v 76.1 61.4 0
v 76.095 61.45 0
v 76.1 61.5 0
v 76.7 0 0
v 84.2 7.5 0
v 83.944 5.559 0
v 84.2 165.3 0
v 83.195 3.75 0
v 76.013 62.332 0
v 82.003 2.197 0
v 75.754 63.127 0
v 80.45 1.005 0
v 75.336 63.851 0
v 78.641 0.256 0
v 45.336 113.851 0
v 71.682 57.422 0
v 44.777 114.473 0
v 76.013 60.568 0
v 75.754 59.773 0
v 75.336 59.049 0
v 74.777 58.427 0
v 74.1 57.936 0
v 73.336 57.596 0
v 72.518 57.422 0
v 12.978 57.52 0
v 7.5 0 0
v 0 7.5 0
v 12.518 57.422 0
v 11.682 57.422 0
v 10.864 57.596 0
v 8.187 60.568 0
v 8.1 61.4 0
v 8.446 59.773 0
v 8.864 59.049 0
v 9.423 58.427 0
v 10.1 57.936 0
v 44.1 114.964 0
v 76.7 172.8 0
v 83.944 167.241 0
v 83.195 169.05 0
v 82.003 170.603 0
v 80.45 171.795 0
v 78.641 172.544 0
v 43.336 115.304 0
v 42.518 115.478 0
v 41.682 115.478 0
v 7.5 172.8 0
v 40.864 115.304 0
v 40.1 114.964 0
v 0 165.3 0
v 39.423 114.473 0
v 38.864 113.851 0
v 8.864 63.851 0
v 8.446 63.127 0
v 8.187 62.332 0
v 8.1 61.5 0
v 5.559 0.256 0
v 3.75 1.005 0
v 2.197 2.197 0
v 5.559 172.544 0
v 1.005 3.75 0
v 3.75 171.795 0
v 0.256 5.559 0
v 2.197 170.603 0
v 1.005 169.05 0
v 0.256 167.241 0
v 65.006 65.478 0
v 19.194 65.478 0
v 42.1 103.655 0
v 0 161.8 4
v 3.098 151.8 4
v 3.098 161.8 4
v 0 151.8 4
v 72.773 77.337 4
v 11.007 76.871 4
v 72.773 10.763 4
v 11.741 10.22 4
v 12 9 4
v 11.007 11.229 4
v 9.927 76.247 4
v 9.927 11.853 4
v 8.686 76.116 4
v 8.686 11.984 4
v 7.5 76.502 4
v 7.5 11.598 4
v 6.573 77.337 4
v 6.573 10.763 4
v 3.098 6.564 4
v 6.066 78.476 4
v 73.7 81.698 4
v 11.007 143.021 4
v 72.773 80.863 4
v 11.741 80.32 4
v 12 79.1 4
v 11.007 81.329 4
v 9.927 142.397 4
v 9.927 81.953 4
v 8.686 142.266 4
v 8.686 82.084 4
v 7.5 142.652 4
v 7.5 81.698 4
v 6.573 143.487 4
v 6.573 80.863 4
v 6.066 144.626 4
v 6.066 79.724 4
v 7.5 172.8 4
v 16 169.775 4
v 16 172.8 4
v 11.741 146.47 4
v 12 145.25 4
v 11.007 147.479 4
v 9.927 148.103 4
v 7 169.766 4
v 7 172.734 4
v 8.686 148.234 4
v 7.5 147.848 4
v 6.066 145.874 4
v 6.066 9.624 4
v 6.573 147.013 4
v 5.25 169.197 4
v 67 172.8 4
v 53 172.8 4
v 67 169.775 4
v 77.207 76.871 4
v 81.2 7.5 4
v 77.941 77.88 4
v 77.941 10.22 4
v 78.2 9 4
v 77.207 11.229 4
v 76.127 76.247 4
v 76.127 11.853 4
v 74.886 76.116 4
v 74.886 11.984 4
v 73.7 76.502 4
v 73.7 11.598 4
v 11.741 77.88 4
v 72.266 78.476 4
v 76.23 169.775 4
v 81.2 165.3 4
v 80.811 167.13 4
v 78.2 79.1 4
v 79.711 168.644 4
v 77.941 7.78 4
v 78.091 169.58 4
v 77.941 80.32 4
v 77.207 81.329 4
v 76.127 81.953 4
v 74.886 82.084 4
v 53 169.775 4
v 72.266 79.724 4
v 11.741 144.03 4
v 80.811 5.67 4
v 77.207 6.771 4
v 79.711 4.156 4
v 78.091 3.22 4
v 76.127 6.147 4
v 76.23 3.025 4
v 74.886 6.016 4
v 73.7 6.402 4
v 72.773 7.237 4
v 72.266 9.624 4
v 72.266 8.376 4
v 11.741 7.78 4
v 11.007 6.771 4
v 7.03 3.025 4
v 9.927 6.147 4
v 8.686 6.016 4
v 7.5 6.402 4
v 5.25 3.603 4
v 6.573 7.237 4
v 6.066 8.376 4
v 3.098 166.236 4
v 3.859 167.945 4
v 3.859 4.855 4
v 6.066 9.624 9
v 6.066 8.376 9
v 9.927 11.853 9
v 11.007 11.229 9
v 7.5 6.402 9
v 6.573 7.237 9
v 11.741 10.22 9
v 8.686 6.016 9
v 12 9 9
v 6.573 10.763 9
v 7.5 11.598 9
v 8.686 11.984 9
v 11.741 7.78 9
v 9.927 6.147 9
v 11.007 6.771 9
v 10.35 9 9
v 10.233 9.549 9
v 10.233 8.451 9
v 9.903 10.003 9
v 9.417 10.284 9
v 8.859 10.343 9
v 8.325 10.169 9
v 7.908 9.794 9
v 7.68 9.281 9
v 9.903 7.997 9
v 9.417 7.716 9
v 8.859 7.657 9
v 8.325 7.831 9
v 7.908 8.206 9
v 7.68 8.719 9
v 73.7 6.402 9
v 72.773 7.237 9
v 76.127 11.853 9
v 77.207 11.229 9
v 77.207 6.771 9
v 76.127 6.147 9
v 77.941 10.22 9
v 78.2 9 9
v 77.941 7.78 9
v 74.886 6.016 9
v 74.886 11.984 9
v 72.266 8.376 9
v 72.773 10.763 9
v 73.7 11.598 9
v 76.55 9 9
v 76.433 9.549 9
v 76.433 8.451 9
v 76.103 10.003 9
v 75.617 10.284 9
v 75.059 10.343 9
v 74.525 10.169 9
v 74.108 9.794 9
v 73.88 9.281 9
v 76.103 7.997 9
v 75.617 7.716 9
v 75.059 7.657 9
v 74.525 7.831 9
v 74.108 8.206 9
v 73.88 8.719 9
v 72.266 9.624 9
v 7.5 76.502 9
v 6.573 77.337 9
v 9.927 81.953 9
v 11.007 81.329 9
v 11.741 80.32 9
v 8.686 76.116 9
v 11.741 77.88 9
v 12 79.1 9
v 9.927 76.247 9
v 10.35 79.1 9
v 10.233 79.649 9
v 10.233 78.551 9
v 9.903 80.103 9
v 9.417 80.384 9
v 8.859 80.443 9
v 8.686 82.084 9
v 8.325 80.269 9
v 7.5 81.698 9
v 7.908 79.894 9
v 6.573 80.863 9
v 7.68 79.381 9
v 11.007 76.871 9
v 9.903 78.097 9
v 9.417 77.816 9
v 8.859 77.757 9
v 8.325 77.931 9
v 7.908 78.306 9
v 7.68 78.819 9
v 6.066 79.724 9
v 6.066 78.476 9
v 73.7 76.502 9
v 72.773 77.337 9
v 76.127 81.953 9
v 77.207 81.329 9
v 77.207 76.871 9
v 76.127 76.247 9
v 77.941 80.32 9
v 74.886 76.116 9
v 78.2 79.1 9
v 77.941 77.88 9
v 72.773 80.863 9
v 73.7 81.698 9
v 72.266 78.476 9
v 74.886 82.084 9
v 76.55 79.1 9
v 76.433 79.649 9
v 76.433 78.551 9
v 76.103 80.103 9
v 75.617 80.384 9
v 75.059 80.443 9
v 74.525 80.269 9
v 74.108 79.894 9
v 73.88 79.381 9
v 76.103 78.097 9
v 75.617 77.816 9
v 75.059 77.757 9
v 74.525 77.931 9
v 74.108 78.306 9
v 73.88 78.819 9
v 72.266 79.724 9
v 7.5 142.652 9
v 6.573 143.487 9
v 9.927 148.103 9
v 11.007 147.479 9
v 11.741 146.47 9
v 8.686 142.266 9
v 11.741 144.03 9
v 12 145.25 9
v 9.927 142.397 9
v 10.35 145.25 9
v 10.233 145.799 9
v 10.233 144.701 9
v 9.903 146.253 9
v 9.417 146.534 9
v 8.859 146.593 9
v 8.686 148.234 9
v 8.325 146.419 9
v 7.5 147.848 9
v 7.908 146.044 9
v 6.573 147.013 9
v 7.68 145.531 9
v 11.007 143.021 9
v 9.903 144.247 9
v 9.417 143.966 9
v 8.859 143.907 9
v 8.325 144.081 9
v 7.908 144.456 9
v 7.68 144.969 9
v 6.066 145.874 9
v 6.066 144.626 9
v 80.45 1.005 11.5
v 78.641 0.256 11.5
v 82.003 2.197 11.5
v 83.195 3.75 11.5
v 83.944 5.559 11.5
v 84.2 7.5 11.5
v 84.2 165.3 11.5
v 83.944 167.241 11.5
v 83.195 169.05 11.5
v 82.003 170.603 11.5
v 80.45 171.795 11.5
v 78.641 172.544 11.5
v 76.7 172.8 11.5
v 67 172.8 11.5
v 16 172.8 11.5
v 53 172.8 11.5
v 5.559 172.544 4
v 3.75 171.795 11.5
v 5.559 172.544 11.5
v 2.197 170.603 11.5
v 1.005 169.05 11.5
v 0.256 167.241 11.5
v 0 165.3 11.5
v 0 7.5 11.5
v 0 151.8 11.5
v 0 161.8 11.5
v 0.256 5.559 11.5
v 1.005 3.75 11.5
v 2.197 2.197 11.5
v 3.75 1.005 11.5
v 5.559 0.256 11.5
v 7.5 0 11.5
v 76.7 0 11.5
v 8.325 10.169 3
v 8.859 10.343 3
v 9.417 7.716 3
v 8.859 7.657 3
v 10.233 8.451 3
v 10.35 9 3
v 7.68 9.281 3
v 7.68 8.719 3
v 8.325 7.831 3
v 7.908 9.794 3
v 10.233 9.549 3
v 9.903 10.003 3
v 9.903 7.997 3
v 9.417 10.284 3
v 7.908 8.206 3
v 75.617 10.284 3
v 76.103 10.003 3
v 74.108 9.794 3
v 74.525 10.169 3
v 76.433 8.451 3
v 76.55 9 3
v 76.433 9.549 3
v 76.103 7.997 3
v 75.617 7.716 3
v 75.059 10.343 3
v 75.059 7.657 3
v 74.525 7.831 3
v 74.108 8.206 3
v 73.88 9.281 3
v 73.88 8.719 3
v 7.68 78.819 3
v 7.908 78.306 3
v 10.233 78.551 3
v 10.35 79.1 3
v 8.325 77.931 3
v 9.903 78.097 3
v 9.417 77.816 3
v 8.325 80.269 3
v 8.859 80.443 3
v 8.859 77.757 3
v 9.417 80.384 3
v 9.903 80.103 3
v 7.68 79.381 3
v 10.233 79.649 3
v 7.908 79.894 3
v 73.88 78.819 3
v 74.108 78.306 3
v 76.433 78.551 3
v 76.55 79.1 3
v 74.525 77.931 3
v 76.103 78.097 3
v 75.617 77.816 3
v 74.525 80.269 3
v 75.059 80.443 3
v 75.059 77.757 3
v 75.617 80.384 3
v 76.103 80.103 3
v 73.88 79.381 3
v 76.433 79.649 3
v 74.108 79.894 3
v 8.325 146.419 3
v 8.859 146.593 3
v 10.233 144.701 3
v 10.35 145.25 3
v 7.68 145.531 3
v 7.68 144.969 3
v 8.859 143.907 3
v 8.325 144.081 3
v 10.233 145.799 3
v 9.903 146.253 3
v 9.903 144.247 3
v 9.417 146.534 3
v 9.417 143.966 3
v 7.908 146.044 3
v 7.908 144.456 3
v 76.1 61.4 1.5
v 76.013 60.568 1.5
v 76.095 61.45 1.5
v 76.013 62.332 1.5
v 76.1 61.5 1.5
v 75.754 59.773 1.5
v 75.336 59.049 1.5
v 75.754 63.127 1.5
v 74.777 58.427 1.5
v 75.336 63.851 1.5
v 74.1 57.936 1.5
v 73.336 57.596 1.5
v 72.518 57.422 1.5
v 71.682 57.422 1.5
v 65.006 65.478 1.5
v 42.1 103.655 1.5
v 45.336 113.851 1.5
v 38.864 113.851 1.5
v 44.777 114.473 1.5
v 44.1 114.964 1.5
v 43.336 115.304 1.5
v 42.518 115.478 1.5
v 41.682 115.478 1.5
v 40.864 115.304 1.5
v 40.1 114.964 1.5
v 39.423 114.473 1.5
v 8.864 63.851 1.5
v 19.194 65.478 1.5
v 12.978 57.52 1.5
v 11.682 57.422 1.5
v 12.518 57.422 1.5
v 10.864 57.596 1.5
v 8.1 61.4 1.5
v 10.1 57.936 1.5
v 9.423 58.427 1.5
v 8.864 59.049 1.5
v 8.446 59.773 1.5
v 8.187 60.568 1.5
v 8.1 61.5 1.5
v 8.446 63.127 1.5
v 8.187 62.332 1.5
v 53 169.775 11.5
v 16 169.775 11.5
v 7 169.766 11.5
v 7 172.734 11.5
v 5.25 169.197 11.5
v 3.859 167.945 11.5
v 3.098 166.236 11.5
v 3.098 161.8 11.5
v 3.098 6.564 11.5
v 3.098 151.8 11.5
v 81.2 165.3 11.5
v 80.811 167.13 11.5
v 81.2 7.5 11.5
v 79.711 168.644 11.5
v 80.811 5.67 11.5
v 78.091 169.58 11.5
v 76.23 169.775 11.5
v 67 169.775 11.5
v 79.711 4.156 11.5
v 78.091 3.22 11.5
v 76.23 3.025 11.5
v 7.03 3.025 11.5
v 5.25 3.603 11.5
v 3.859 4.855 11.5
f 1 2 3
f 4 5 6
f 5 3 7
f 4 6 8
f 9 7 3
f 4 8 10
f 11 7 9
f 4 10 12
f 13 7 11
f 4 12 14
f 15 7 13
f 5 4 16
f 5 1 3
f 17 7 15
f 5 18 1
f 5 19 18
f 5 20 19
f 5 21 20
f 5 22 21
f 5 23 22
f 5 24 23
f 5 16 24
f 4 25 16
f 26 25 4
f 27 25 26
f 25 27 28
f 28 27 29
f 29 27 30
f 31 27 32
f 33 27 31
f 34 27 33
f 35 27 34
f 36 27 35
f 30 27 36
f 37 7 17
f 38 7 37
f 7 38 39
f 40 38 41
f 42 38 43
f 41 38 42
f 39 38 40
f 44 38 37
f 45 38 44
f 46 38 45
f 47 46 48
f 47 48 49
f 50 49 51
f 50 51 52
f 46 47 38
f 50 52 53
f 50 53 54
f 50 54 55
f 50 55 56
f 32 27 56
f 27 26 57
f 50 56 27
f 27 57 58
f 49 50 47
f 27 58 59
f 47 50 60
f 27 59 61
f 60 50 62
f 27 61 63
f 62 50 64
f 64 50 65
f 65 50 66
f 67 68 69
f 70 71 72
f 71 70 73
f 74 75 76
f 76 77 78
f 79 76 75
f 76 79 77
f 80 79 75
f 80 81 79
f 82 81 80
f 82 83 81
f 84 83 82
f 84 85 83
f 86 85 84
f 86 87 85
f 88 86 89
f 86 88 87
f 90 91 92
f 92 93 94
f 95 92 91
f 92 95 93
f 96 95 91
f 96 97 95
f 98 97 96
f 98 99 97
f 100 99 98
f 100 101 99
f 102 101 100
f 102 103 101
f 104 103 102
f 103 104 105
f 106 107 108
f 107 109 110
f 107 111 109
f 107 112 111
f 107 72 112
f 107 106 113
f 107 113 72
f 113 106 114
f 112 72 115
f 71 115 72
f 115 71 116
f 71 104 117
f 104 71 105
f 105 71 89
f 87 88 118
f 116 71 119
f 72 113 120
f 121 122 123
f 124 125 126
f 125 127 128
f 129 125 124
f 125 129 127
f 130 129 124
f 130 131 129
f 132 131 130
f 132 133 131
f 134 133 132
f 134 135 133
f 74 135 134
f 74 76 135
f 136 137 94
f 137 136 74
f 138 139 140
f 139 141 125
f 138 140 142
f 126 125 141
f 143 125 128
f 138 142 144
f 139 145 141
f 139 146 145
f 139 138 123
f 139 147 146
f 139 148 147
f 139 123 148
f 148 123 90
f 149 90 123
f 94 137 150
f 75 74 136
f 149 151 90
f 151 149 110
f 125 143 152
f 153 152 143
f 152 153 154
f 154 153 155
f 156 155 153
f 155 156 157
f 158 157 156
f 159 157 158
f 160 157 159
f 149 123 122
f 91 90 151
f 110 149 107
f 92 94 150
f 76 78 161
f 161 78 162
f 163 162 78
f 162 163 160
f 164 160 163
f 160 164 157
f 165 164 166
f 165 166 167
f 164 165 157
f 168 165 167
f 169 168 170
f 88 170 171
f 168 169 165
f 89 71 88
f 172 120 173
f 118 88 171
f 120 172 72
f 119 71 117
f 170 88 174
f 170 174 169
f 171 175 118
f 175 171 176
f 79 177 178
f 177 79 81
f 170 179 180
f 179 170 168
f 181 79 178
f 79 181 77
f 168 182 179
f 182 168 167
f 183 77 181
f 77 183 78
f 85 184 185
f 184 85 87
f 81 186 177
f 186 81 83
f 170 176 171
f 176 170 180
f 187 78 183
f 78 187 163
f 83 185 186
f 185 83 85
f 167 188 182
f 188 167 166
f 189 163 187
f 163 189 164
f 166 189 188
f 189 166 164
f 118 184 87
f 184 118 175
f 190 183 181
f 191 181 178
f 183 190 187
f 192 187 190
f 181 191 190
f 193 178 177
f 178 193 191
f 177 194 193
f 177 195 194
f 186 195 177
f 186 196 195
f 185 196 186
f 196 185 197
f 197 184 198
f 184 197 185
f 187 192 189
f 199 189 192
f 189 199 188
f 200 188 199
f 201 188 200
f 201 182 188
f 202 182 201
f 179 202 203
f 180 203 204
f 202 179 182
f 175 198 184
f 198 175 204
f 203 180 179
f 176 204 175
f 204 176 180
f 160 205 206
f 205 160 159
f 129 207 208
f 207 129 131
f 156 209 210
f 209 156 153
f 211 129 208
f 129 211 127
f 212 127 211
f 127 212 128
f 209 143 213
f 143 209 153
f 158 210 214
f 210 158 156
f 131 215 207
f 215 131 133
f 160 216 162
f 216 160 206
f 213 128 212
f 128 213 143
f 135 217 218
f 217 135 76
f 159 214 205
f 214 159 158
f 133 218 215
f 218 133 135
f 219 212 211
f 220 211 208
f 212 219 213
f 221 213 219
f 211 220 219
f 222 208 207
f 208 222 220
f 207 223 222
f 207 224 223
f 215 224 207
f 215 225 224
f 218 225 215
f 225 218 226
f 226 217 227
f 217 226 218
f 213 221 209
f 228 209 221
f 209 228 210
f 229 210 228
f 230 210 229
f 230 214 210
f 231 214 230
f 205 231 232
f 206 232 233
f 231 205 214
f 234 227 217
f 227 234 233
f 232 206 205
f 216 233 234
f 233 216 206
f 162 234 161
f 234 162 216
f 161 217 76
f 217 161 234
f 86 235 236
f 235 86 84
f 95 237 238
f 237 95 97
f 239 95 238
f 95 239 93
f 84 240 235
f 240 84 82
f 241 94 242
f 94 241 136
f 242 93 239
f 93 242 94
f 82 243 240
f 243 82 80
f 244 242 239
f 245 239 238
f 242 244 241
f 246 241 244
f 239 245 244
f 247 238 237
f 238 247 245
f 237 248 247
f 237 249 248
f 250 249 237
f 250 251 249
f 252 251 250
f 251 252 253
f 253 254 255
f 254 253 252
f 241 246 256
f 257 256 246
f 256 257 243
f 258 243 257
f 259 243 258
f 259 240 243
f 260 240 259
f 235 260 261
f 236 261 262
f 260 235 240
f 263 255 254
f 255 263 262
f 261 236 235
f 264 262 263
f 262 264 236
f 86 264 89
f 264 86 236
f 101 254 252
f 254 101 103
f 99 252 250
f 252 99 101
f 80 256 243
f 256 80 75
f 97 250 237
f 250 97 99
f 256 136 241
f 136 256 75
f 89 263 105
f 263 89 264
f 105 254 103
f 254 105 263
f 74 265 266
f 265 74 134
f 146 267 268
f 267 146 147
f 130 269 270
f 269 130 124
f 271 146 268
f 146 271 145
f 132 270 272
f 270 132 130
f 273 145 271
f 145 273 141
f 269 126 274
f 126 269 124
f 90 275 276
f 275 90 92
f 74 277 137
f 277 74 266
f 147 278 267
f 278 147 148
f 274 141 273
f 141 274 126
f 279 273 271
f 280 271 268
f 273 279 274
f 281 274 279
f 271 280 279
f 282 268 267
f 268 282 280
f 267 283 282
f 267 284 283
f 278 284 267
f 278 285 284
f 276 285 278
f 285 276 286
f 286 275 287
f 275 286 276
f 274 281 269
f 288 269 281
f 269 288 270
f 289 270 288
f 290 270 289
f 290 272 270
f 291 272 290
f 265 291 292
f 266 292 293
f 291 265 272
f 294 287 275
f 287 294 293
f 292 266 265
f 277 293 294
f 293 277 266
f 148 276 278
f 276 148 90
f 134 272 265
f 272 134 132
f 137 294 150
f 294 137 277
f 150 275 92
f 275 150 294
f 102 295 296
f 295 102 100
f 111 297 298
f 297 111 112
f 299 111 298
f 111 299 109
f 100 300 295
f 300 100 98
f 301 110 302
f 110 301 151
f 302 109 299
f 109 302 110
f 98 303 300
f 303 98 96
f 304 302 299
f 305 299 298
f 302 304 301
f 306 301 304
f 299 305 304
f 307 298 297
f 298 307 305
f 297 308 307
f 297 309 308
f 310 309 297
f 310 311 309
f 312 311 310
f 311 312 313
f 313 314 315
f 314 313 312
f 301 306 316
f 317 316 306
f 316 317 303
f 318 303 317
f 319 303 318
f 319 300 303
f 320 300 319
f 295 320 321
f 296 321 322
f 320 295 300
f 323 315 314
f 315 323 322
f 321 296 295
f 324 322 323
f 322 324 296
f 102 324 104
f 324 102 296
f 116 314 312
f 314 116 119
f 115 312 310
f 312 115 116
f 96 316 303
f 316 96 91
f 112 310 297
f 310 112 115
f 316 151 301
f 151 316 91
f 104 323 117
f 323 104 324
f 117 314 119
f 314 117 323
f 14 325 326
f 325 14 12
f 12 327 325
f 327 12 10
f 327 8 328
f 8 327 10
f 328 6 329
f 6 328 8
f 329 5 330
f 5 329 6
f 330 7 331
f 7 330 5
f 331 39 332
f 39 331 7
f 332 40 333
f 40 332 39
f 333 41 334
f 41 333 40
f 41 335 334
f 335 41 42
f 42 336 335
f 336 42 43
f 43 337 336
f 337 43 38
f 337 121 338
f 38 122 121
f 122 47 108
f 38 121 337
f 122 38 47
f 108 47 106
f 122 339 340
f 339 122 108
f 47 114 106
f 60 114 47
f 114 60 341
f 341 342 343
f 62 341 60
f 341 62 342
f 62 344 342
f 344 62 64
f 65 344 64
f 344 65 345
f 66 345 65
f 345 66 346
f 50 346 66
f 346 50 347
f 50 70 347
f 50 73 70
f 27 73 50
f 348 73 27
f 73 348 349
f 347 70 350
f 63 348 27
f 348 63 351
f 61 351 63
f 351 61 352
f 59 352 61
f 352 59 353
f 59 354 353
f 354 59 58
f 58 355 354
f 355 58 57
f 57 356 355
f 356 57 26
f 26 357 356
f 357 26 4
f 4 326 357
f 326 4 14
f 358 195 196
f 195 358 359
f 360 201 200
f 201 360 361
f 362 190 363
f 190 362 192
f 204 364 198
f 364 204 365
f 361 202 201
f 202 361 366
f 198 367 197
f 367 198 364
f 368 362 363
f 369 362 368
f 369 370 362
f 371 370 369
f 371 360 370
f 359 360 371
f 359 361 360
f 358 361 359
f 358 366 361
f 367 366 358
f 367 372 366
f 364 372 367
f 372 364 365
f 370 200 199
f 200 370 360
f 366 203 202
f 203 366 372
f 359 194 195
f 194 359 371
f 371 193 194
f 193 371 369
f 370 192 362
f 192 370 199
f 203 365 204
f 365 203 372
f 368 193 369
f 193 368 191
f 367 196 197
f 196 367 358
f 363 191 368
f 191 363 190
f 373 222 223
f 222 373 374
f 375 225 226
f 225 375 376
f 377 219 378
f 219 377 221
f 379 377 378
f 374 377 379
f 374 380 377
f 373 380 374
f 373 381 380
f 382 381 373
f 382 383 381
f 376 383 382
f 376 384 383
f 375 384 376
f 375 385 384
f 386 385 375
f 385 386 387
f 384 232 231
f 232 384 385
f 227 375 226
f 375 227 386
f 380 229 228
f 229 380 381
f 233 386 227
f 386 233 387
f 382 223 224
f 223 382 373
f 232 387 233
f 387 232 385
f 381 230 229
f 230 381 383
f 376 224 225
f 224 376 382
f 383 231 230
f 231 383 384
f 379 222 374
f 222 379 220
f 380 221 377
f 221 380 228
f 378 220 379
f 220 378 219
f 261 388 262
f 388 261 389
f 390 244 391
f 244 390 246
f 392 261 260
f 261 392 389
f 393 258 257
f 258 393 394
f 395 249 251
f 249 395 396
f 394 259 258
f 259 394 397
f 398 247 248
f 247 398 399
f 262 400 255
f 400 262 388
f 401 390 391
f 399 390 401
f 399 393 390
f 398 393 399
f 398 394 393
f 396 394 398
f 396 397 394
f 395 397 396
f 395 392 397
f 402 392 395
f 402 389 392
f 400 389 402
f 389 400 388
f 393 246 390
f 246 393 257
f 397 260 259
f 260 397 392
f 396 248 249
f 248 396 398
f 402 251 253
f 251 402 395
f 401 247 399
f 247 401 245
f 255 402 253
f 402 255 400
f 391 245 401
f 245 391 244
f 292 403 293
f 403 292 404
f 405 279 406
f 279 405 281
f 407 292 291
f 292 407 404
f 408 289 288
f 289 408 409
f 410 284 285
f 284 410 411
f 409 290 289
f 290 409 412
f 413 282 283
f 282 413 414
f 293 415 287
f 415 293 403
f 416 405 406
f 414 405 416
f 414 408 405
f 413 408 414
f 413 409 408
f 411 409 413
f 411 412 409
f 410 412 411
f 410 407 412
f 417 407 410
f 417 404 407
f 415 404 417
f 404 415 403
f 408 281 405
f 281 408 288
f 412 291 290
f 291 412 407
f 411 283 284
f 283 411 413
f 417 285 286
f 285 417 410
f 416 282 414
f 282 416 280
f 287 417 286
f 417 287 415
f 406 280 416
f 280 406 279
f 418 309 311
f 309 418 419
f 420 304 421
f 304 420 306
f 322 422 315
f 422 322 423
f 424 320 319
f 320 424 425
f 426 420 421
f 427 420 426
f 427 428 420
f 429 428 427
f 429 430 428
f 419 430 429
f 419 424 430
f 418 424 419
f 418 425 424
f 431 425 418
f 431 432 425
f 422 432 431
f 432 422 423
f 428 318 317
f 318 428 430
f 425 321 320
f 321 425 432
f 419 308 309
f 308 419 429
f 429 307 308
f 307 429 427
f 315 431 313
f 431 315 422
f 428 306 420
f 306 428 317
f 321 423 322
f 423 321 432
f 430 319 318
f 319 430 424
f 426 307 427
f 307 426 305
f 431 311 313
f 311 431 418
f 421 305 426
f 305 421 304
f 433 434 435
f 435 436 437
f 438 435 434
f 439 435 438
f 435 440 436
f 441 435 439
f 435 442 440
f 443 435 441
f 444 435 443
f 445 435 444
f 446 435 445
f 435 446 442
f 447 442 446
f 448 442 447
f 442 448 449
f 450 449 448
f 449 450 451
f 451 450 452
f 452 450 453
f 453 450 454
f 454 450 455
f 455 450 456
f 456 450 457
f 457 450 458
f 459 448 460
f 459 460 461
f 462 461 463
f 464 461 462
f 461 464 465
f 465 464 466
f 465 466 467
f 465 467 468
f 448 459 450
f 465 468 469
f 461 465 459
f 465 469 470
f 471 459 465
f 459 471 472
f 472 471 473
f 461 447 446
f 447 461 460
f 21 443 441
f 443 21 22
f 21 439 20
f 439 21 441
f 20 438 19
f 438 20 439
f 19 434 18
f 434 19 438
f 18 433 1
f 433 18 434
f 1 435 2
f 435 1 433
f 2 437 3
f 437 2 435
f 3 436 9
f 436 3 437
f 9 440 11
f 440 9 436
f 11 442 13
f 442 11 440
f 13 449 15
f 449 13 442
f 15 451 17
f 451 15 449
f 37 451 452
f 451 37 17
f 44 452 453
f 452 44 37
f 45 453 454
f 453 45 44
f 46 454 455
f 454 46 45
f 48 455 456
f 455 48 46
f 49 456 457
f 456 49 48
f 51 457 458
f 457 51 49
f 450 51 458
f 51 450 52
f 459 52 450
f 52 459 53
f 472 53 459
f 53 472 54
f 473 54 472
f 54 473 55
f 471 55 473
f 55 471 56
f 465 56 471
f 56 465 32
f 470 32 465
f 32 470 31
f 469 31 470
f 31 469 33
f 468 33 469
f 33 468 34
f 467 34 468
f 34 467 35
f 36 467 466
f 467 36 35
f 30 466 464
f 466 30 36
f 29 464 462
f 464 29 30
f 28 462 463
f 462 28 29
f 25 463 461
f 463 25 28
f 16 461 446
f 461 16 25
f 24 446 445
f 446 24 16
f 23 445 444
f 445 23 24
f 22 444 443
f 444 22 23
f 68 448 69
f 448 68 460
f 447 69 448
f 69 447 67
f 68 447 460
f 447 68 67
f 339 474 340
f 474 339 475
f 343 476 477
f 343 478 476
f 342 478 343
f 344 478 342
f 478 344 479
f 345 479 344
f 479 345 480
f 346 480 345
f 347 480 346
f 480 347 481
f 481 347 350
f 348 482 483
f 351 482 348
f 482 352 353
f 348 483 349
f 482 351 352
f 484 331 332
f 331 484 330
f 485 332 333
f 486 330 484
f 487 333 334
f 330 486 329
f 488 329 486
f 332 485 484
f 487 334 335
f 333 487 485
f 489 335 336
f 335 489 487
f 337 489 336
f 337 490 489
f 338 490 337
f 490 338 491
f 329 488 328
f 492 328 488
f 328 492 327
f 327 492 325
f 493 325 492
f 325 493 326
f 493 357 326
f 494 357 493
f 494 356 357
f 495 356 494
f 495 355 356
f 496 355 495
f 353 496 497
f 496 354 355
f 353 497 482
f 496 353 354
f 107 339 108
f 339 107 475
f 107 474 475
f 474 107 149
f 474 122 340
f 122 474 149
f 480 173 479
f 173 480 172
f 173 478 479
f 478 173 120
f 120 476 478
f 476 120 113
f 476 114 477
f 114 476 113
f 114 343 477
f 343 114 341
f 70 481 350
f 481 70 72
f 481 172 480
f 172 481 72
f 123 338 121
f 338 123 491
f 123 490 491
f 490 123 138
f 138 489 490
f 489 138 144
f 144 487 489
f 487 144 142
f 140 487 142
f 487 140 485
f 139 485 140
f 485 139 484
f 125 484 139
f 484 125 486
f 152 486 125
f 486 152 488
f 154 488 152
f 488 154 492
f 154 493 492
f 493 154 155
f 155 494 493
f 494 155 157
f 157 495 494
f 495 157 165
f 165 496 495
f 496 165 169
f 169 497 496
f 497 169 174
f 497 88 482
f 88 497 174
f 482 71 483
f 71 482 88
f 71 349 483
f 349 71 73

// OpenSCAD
delta_pico_width = 78.2;
delta_pico_height = 166.8;
delta_pico_corner_radius = 4.5;

border_size = 3;

power_switch_offset = 8;
power_switch_length = 10;
jst_offset = 4;
jst_length = 9;
usb_offset = 50;
usb_length = 14;

screws_edge_distance = 6;
bottom_screws_offset = 6;
middle_screws_offset = 76.1;
top_screw_offset = 142.25;

edge_cutout_size = border_size + 1;

base_height = 4;
screw_depth = 6;
peg_height = 5;

module delta_pico() {
    translate([delta_pico_corner_radius, delta_pico_corner_radius])
    minkowski() {
        circle(delta_pico_corner_radius);
        square([
            delta_pico_width - delta_pico_corner_radius * 2,
            delta_pico_height - delta_pico_corner_radius * 2
        ]);
    }
}

module delta_pico_outline() {
    difference() {
        translate([border_size + delta_pico_corner_radius, border_size + delta_pico_corner_radius])
        minkowski() {
            circle(border_size + delta_pico_corner_radius);
            square([
                delta_pico_width - delta_pico_corner_radius * 2,
                delta_pico_height - delta_pico_corner_radius * 2
            ]);
        }

        // Cut out the calculator itself
        translate([border_size, border_size])
        delta_pico();
    }
}

module delta_pico_outline_with_cutouts() {
    difference() {
        delta_pico_outline();
        
        // Cut out the power switch
        translate([0, border_size + delta_pico_height - power_switch_offset - power_switch_length])
        square([edge_cutout_size, power_switch_length]);
        
        // Cut out the JST connector
        translate([border_size + jst_offset, border_size + delta_pico_height - 1])
        square([jst_length, edge_cutout_size]);
        
        // Cut out the USB port
        translate([border_size + usb_offset, border_size + delta_pico_height - 1])
        square([usb_length, edge_cutout_size]);
    }
}

module screw_hole() {
    linear_extrude(screw_depth)
    circle(d=2.7, $fn=15);
}

module screw_peg() {
    linear_extrude(peg_height)
    circle(d=6, $fn=15);
}

module base() {
    difference() {
        union() {
            linear_extrude(base_height)
            delta_pico_outline();
            
            translate([border_size, border_size]) {
                linear_extrude(base_height)
                delta_pico();
                
                translate([6, 6, base_height])
                screw_peg();
                
                translate([delta_pico_width - 6, 6, base_height])
                screw_peg();
                
                translate([6, middle_screws_offset, base_height])
                screw_peg();
                
                translate([delta_pico_width - 6, middle_screws_offset, base_height])
                screw_peg();
                
                translate([6, top_screw_offset, base_height])
                screw_peg();
            }
        }
        
        translate([border_size, border_size]) {
            screw_offset = base_height - screw_depth + peg_height;
            
            translate([6, 6, screw_offset])
            screw_hole();
            
            translate([delta_pico_width - 6, 6, screw_offset])
            screw_hole();
            
            translate([6, middle_screws_offset, screw_offset])
            screw_hole();
                
            translate([delta_pico_width - 6, middle_screws_offset, screw_offset])
            screw_hole();
            
            translate([6, top_screw_offset, screw_offset])
            screw_hole();
        }
    }
}

module logo() {
    translate([3 - 60 / 2, 3 - 50 / 2])
    minkowski() {
        polygon([
            [0, 0],
            [30, 50],
            [60, 0],
            [0, 0.1],
            [60, 0.1],
            [30, 50.1],
            [0, 0.1]
        ]);
        circle(4, $fn=30);
    }
}

difference() {
    base();

    translate([delta_pico_width / 2, delta_pico_height / 2])
    linear_extrude(base_height - 2.5)
    logo();
}

translate([0, 0, base_height])
linear_extrude(7.5)
delta_pico_outline_with_cutouts();
